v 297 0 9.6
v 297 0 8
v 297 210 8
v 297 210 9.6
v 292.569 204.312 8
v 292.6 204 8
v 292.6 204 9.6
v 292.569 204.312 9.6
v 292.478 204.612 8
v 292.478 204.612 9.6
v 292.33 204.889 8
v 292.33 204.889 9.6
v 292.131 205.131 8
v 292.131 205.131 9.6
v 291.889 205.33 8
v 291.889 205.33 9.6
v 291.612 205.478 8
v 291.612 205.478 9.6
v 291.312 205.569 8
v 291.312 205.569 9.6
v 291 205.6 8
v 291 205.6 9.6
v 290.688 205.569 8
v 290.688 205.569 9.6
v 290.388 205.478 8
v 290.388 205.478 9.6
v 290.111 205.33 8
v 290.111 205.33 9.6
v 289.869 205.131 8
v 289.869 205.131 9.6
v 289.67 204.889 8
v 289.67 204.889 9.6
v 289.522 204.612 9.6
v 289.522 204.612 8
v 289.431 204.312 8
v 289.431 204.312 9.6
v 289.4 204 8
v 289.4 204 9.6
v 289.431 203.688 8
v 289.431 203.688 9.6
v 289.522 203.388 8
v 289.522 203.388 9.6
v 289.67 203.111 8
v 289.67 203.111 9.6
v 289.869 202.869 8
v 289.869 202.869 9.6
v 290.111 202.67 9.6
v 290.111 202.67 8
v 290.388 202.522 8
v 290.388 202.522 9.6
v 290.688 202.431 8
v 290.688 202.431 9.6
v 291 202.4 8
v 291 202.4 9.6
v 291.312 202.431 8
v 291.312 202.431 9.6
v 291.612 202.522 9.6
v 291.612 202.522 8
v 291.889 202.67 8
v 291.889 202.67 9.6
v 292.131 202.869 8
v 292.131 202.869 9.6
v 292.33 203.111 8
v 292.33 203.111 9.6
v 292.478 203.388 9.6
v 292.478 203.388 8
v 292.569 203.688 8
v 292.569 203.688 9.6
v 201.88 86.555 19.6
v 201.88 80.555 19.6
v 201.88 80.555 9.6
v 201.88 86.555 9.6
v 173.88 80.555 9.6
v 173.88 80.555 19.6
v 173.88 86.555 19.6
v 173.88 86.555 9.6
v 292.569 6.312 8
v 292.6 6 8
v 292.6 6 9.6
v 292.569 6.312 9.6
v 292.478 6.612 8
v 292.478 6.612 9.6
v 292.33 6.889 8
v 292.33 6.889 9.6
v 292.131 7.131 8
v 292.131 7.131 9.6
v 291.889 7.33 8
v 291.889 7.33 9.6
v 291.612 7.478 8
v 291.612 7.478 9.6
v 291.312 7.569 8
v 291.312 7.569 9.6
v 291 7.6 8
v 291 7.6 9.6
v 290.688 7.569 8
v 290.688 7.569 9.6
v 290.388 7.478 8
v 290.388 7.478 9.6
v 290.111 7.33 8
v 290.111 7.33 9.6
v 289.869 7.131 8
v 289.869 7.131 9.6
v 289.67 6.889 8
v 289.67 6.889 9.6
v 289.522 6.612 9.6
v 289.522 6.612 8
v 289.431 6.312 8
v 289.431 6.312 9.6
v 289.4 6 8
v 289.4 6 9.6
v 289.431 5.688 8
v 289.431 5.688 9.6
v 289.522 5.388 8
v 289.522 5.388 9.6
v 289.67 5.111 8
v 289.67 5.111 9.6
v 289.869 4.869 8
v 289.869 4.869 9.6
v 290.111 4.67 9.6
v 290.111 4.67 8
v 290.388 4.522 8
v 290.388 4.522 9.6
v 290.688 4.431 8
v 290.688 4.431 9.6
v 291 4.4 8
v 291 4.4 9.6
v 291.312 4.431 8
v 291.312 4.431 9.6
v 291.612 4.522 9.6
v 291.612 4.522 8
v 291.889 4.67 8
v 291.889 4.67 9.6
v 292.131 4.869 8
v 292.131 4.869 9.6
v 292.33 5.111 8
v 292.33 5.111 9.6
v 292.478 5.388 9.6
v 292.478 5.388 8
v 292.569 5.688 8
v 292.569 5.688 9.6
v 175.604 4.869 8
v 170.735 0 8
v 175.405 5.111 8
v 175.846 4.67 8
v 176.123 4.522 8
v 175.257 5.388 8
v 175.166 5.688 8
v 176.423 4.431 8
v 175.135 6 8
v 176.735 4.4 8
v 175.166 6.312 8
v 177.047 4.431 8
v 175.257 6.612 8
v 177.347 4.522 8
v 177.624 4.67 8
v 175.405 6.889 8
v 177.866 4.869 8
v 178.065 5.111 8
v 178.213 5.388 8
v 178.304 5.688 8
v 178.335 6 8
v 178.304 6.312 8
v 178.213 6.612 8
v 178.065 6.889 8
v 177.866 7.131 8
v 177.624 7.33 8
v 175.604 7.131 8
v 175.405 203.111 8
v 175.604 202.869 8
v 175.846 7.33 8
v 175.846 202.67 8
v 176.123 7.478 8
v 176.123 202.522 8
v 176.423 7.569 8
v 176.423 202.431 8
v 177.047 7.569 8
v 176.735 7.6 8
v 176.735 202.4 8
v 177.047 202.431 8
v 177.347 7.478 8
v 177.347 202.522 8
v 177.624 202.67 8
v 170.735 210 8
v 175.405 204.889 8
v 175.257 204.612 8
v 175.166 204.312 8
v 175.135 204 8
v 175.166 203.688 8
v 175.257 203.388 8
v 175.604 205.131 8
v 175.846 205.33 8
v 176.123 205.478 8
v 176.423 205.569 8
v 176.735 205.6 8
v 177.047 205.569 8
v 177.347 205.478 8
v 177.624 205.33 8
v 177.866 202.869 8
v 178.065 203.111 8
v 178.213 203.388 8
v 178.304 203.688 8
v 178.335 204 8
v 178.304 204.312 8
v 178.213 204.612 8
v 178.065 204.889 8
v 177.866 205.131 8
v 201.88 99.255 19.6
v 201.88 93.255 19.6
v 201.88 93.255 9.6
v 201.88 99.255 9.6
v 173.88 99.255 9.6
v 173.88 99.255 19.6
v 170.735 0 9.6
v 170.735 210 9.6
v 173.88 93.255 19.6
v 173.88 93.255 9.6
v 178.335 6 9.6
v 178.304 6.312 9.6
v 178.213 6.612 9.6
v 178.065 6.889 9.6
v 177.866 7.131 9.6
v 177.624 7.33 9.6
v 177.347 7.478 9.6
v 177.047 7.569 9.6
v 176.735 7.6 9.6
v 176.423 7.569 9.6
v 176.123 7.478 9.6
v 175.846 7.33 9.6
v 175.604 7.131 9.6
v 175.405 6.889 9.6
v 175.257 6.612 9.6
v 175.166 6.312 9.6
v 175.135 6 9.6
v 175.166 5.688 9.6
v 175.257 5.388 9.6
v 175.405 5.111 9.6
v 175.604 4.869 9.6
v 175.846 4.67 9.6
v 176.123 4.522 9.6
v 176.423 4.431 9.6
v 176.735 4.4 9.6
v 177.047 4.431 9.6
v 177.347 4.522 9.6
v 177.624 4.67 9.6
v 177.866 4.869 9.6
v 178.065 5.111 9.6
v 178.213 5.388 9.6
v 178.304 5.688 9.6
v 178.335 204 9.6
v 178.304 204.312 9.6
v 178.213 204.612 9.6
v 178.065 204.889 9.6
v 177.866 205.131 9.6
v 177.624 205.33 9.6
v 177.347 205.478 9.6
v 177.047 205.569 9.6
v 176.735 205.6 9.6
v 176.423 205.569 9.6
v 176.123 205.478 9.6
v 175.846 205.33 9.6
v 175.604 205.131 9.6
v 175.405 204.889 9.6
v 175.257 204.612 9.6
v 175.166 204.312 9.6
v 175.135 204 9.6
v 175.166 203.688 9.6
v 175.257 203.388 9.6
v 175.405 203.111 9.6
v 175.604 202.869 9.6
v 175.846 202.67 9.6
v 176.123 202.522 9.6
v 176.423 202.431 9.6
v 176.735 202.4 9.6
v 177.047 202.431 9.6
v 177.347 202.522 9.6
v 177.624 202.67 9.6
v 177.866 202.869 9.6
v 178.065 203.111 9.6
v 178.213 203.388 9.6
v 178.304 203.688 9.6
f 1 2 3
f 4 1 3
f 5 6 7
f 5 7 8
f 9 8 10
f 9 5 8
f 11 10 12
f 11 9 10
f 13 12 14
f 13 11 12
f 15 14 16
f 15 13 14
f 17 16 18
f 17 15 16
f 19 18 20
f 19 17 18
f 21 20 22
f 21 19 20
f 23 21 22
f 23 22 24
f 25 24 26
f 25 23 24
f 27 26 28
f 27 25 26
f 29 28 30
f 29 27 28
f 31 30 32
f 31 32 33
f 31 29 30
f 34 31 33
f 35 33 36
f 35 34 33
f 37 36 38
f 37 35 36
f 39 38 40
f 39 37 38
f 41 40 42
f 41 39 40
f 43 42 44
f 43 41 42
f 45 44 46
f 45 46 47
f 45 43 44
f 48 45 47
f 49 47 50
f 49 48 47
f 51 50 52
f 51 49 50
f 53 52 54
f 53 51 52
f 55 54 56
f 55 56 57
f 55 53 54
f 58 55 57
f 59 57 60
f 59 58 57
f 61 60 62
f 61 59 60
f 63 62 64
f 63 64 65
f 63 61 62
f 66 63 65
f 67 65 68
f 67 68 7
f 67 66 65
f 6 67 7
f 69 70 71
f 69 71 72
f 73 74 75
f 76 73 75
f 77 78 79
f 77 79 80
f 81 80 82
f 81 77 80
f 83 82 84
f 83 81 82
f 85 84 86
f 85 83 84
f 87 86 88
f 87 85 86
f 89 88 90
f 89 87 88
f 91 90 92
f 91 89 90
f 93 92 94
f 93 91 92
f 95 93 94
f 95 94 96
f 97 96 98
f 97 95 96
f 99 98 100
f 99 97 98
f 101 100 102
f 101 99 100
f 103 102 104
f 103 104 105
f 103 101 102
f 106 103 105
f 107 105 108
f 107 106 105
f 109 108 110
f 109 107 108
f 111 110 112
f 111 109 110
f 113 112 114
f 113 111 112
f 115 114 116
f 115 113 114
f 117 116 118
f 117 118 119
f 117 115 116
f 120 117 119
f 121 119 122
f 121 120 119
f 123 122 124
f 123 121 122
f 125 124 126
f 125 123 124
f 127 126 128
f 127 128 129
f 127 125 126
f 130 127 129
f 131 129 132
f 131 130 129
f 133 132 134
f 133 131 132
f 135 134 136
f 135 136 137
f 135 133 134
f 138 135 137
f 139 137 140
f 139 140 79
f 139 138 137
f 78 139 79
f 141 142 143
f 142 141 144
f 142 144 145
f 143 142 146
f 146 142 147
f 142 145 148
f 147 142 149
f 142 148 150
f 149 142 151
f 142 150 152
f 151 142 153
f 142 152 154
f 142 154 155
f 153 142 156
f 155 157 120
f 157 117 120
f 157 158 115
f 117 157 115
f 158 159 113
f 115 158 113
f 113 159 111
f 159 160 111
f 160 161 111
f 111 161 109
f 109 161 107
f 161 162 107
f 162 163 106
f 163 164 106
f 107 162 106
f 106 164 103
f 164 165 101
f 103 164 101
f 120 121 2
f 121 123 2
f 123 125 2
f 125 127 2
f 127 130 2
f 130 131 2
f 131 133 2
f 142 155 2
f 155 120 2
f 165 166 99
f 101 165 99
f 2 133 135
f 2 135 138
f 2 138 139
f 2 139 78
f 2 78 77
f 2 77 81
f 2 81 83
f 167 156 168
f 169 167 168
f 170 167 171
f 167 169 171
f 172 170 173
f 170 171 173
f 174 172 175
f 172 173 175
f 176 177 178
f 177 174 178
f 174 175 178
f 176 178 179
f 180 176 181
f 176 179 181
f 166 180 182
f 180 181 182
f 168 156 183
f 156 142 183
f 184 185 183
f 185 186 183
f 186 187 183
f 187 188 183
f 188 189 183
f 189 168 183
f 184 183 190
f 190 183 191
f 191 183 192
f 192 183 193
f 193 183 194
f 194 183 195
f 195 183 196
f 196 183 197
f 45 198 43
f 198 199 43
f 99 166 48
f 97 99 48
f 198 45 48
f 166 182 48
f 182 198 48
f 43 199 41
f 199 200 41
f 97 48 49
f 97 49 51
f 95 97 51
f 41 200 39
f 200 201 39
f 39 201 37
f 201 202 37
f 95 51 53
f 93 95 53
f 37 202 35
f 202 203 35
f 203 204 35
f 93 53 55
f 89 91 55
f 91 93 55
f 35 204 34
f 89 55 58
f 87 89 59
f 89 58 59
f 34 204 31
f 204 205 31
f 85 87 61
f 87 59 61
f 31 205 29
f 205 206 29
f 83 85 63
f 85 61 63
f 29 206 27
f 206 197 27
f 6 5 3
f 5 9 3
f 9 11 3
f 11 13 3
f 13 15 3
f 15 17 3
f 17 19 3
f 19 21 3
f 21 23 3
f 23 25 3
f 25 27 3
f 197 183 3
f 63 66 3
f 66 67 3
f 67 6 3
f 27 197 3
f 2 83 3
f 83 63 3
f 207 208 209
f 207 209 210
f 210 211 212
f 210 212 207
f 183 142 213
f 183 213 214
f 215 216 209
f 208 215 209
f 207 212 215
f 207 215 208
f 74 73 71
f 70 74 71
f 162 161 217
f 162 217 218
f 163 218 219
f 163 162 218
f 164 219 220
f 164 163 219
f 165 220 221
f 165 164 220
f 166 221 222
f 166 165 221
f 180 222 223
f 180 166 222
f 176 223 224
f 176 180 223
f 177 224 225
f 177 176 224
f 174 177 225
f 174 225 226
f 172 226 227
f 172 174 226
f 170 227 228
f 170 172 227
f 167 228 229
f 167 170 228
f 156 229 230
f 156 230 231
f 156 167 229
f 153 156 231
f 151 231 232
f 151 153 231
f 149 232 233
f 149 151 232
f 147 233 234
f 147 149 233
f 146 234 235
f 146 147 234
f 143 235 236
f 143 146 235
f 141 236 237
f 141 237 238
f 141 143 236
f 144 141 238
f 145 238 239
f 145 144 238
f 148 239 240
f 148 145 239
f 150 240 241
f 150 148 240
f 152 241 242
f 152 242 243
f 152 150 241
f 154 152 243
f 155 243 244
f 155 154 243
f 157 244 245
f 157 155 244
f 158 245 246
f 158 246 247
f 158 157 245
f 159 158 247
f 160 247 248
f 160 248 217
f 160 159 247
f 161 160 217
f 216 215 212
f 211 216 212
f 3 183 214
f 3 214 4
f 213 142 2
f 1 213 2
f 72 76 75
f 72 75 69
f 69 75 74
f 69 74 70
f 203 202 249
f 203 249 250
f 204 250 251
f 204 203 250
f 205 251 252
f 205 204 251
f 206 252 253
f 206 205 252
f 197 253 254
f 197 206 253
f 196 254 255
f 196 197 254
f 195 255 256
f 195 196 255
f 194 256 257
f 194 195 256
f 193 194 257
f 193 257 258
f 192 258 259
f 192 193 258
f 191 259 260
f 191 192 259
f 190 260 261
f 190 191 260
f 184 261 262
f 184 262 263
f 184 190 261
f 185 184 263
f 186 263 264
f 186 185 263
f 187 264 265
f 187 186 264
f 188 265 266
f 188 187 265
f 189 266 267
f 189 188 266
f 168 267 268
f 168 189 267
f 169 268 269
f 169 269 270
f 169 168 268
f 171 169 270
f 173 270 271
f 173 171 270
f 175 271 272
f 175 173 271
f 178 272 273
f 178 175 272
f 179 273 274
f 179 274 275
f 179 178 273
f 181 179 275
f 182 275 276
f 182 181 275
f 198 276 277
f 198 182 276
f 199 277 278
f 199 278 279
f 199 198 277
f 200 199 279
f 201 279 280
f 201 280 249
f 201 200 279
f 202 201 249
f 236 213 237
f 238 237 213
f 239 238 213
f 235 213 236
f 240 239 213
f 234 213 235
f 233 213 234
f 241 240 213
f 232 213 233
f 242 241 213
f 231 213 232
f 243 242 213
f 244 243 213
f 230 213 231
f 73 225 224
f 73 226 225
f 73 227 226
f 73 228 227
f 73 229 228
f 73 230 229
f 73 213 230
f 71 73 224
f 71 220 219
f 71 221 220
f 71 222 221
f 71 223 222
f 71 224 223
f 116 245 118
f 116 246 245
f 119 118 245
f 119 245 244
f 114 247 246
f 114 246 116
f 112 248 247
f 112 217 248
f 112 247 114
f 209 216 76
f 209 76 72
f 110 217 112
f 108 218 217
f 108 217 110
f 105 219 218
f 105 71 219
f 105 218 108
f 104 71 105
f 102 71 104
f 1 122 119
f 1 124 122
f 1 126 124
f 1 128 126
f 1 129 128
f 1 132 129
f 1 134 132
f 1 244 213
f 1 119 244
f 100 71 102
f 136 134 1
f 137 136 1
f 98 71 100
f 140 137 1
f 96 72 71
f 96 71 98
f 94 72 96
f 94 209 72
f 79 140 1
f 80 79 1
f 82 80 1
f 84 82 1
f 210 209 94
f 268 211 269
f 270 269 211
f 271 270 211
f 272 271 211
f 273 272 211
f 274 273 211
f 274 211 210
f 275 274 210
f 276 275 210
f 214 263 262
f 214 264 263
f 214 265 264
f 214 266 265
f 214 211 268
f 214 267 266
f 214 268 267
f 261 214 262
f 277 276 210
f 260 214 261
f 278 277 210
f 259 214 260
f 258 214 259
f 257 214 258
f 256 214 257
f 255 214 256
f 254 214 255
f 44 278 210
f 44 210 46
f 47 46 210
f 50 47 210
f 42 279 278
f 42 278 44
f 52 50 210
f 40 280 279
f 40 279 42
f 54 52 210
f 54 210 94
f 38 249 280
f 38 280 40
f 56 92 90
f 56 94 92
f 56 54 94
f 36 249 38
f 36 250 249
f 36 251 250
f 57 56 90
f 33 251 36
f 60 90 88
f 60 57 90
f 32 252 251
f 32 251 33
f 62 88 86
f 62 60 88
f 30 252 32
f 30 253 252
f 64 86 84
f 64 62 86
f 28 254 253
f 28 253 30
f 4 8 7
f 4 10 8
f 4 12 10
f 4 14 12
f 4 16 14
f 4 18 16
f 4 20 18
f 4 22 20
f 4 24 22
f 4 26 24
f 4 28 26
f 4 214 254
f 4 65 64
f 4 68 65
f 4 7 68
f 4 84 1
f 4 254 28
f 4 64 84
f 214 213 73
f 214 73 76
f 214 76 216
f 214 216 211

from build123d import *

# Parameters (mm, degrees)
SKETCH001_W      = 126.265
SKETCH001_H      = 210
SKETCH001_R      = 1.6
EXTRUDE001_DEPTH = 1.6
SKETCH006_W      = 28
SKETCH006_H      = 6
EXTRUDE006_DEPTH = 10


with BuildPart() as extrude001:
    # Sketch001 → Extrude001 (new body)
    with BuildSketch(Plane.XY.offset(8)):
        with Locations((233.8675, 105)):
            Rectangle(SKETCH001_W, SKETCH001_H)
        with Locations((176.735, 204)):
            Circle(SKETCH001_R, mode=Mode.SUBTRACT)
        with Locations((291, 204)):
            Circle(SKETCH001_R, mode=Mode.SUBTRACT)
        with Locations((291, 6)):
            Circle(SKETCH001_R, mode=Mode.SUBTRACT)
        with Locations((176.735, 6)):
            Circle(SKETCH001_R, mode=Mode.SUBTRACT)
    extrude(amount=EXTRUDE001_DEPTH)


with BuildPart() as ula8:
    # Sketch006 (on Face10 of Extrude001) → Extrude006 (new body)
    with BuildSketch(Plane.XY.offset(9.6)):
        with Locations((187.88, 96.255)):
            Rectangle(SKETCH006_W, SKETCH006_H)
        with Locations((187.88, 83.555)):
            Rectangle(SKETCH006_W, SKETCH006_H)
    extrude(amount=EXTRUDE006_DEPTH)

    # Fusion003: union Extrude001
    add(extrude001.part)


solid = ula8.part
